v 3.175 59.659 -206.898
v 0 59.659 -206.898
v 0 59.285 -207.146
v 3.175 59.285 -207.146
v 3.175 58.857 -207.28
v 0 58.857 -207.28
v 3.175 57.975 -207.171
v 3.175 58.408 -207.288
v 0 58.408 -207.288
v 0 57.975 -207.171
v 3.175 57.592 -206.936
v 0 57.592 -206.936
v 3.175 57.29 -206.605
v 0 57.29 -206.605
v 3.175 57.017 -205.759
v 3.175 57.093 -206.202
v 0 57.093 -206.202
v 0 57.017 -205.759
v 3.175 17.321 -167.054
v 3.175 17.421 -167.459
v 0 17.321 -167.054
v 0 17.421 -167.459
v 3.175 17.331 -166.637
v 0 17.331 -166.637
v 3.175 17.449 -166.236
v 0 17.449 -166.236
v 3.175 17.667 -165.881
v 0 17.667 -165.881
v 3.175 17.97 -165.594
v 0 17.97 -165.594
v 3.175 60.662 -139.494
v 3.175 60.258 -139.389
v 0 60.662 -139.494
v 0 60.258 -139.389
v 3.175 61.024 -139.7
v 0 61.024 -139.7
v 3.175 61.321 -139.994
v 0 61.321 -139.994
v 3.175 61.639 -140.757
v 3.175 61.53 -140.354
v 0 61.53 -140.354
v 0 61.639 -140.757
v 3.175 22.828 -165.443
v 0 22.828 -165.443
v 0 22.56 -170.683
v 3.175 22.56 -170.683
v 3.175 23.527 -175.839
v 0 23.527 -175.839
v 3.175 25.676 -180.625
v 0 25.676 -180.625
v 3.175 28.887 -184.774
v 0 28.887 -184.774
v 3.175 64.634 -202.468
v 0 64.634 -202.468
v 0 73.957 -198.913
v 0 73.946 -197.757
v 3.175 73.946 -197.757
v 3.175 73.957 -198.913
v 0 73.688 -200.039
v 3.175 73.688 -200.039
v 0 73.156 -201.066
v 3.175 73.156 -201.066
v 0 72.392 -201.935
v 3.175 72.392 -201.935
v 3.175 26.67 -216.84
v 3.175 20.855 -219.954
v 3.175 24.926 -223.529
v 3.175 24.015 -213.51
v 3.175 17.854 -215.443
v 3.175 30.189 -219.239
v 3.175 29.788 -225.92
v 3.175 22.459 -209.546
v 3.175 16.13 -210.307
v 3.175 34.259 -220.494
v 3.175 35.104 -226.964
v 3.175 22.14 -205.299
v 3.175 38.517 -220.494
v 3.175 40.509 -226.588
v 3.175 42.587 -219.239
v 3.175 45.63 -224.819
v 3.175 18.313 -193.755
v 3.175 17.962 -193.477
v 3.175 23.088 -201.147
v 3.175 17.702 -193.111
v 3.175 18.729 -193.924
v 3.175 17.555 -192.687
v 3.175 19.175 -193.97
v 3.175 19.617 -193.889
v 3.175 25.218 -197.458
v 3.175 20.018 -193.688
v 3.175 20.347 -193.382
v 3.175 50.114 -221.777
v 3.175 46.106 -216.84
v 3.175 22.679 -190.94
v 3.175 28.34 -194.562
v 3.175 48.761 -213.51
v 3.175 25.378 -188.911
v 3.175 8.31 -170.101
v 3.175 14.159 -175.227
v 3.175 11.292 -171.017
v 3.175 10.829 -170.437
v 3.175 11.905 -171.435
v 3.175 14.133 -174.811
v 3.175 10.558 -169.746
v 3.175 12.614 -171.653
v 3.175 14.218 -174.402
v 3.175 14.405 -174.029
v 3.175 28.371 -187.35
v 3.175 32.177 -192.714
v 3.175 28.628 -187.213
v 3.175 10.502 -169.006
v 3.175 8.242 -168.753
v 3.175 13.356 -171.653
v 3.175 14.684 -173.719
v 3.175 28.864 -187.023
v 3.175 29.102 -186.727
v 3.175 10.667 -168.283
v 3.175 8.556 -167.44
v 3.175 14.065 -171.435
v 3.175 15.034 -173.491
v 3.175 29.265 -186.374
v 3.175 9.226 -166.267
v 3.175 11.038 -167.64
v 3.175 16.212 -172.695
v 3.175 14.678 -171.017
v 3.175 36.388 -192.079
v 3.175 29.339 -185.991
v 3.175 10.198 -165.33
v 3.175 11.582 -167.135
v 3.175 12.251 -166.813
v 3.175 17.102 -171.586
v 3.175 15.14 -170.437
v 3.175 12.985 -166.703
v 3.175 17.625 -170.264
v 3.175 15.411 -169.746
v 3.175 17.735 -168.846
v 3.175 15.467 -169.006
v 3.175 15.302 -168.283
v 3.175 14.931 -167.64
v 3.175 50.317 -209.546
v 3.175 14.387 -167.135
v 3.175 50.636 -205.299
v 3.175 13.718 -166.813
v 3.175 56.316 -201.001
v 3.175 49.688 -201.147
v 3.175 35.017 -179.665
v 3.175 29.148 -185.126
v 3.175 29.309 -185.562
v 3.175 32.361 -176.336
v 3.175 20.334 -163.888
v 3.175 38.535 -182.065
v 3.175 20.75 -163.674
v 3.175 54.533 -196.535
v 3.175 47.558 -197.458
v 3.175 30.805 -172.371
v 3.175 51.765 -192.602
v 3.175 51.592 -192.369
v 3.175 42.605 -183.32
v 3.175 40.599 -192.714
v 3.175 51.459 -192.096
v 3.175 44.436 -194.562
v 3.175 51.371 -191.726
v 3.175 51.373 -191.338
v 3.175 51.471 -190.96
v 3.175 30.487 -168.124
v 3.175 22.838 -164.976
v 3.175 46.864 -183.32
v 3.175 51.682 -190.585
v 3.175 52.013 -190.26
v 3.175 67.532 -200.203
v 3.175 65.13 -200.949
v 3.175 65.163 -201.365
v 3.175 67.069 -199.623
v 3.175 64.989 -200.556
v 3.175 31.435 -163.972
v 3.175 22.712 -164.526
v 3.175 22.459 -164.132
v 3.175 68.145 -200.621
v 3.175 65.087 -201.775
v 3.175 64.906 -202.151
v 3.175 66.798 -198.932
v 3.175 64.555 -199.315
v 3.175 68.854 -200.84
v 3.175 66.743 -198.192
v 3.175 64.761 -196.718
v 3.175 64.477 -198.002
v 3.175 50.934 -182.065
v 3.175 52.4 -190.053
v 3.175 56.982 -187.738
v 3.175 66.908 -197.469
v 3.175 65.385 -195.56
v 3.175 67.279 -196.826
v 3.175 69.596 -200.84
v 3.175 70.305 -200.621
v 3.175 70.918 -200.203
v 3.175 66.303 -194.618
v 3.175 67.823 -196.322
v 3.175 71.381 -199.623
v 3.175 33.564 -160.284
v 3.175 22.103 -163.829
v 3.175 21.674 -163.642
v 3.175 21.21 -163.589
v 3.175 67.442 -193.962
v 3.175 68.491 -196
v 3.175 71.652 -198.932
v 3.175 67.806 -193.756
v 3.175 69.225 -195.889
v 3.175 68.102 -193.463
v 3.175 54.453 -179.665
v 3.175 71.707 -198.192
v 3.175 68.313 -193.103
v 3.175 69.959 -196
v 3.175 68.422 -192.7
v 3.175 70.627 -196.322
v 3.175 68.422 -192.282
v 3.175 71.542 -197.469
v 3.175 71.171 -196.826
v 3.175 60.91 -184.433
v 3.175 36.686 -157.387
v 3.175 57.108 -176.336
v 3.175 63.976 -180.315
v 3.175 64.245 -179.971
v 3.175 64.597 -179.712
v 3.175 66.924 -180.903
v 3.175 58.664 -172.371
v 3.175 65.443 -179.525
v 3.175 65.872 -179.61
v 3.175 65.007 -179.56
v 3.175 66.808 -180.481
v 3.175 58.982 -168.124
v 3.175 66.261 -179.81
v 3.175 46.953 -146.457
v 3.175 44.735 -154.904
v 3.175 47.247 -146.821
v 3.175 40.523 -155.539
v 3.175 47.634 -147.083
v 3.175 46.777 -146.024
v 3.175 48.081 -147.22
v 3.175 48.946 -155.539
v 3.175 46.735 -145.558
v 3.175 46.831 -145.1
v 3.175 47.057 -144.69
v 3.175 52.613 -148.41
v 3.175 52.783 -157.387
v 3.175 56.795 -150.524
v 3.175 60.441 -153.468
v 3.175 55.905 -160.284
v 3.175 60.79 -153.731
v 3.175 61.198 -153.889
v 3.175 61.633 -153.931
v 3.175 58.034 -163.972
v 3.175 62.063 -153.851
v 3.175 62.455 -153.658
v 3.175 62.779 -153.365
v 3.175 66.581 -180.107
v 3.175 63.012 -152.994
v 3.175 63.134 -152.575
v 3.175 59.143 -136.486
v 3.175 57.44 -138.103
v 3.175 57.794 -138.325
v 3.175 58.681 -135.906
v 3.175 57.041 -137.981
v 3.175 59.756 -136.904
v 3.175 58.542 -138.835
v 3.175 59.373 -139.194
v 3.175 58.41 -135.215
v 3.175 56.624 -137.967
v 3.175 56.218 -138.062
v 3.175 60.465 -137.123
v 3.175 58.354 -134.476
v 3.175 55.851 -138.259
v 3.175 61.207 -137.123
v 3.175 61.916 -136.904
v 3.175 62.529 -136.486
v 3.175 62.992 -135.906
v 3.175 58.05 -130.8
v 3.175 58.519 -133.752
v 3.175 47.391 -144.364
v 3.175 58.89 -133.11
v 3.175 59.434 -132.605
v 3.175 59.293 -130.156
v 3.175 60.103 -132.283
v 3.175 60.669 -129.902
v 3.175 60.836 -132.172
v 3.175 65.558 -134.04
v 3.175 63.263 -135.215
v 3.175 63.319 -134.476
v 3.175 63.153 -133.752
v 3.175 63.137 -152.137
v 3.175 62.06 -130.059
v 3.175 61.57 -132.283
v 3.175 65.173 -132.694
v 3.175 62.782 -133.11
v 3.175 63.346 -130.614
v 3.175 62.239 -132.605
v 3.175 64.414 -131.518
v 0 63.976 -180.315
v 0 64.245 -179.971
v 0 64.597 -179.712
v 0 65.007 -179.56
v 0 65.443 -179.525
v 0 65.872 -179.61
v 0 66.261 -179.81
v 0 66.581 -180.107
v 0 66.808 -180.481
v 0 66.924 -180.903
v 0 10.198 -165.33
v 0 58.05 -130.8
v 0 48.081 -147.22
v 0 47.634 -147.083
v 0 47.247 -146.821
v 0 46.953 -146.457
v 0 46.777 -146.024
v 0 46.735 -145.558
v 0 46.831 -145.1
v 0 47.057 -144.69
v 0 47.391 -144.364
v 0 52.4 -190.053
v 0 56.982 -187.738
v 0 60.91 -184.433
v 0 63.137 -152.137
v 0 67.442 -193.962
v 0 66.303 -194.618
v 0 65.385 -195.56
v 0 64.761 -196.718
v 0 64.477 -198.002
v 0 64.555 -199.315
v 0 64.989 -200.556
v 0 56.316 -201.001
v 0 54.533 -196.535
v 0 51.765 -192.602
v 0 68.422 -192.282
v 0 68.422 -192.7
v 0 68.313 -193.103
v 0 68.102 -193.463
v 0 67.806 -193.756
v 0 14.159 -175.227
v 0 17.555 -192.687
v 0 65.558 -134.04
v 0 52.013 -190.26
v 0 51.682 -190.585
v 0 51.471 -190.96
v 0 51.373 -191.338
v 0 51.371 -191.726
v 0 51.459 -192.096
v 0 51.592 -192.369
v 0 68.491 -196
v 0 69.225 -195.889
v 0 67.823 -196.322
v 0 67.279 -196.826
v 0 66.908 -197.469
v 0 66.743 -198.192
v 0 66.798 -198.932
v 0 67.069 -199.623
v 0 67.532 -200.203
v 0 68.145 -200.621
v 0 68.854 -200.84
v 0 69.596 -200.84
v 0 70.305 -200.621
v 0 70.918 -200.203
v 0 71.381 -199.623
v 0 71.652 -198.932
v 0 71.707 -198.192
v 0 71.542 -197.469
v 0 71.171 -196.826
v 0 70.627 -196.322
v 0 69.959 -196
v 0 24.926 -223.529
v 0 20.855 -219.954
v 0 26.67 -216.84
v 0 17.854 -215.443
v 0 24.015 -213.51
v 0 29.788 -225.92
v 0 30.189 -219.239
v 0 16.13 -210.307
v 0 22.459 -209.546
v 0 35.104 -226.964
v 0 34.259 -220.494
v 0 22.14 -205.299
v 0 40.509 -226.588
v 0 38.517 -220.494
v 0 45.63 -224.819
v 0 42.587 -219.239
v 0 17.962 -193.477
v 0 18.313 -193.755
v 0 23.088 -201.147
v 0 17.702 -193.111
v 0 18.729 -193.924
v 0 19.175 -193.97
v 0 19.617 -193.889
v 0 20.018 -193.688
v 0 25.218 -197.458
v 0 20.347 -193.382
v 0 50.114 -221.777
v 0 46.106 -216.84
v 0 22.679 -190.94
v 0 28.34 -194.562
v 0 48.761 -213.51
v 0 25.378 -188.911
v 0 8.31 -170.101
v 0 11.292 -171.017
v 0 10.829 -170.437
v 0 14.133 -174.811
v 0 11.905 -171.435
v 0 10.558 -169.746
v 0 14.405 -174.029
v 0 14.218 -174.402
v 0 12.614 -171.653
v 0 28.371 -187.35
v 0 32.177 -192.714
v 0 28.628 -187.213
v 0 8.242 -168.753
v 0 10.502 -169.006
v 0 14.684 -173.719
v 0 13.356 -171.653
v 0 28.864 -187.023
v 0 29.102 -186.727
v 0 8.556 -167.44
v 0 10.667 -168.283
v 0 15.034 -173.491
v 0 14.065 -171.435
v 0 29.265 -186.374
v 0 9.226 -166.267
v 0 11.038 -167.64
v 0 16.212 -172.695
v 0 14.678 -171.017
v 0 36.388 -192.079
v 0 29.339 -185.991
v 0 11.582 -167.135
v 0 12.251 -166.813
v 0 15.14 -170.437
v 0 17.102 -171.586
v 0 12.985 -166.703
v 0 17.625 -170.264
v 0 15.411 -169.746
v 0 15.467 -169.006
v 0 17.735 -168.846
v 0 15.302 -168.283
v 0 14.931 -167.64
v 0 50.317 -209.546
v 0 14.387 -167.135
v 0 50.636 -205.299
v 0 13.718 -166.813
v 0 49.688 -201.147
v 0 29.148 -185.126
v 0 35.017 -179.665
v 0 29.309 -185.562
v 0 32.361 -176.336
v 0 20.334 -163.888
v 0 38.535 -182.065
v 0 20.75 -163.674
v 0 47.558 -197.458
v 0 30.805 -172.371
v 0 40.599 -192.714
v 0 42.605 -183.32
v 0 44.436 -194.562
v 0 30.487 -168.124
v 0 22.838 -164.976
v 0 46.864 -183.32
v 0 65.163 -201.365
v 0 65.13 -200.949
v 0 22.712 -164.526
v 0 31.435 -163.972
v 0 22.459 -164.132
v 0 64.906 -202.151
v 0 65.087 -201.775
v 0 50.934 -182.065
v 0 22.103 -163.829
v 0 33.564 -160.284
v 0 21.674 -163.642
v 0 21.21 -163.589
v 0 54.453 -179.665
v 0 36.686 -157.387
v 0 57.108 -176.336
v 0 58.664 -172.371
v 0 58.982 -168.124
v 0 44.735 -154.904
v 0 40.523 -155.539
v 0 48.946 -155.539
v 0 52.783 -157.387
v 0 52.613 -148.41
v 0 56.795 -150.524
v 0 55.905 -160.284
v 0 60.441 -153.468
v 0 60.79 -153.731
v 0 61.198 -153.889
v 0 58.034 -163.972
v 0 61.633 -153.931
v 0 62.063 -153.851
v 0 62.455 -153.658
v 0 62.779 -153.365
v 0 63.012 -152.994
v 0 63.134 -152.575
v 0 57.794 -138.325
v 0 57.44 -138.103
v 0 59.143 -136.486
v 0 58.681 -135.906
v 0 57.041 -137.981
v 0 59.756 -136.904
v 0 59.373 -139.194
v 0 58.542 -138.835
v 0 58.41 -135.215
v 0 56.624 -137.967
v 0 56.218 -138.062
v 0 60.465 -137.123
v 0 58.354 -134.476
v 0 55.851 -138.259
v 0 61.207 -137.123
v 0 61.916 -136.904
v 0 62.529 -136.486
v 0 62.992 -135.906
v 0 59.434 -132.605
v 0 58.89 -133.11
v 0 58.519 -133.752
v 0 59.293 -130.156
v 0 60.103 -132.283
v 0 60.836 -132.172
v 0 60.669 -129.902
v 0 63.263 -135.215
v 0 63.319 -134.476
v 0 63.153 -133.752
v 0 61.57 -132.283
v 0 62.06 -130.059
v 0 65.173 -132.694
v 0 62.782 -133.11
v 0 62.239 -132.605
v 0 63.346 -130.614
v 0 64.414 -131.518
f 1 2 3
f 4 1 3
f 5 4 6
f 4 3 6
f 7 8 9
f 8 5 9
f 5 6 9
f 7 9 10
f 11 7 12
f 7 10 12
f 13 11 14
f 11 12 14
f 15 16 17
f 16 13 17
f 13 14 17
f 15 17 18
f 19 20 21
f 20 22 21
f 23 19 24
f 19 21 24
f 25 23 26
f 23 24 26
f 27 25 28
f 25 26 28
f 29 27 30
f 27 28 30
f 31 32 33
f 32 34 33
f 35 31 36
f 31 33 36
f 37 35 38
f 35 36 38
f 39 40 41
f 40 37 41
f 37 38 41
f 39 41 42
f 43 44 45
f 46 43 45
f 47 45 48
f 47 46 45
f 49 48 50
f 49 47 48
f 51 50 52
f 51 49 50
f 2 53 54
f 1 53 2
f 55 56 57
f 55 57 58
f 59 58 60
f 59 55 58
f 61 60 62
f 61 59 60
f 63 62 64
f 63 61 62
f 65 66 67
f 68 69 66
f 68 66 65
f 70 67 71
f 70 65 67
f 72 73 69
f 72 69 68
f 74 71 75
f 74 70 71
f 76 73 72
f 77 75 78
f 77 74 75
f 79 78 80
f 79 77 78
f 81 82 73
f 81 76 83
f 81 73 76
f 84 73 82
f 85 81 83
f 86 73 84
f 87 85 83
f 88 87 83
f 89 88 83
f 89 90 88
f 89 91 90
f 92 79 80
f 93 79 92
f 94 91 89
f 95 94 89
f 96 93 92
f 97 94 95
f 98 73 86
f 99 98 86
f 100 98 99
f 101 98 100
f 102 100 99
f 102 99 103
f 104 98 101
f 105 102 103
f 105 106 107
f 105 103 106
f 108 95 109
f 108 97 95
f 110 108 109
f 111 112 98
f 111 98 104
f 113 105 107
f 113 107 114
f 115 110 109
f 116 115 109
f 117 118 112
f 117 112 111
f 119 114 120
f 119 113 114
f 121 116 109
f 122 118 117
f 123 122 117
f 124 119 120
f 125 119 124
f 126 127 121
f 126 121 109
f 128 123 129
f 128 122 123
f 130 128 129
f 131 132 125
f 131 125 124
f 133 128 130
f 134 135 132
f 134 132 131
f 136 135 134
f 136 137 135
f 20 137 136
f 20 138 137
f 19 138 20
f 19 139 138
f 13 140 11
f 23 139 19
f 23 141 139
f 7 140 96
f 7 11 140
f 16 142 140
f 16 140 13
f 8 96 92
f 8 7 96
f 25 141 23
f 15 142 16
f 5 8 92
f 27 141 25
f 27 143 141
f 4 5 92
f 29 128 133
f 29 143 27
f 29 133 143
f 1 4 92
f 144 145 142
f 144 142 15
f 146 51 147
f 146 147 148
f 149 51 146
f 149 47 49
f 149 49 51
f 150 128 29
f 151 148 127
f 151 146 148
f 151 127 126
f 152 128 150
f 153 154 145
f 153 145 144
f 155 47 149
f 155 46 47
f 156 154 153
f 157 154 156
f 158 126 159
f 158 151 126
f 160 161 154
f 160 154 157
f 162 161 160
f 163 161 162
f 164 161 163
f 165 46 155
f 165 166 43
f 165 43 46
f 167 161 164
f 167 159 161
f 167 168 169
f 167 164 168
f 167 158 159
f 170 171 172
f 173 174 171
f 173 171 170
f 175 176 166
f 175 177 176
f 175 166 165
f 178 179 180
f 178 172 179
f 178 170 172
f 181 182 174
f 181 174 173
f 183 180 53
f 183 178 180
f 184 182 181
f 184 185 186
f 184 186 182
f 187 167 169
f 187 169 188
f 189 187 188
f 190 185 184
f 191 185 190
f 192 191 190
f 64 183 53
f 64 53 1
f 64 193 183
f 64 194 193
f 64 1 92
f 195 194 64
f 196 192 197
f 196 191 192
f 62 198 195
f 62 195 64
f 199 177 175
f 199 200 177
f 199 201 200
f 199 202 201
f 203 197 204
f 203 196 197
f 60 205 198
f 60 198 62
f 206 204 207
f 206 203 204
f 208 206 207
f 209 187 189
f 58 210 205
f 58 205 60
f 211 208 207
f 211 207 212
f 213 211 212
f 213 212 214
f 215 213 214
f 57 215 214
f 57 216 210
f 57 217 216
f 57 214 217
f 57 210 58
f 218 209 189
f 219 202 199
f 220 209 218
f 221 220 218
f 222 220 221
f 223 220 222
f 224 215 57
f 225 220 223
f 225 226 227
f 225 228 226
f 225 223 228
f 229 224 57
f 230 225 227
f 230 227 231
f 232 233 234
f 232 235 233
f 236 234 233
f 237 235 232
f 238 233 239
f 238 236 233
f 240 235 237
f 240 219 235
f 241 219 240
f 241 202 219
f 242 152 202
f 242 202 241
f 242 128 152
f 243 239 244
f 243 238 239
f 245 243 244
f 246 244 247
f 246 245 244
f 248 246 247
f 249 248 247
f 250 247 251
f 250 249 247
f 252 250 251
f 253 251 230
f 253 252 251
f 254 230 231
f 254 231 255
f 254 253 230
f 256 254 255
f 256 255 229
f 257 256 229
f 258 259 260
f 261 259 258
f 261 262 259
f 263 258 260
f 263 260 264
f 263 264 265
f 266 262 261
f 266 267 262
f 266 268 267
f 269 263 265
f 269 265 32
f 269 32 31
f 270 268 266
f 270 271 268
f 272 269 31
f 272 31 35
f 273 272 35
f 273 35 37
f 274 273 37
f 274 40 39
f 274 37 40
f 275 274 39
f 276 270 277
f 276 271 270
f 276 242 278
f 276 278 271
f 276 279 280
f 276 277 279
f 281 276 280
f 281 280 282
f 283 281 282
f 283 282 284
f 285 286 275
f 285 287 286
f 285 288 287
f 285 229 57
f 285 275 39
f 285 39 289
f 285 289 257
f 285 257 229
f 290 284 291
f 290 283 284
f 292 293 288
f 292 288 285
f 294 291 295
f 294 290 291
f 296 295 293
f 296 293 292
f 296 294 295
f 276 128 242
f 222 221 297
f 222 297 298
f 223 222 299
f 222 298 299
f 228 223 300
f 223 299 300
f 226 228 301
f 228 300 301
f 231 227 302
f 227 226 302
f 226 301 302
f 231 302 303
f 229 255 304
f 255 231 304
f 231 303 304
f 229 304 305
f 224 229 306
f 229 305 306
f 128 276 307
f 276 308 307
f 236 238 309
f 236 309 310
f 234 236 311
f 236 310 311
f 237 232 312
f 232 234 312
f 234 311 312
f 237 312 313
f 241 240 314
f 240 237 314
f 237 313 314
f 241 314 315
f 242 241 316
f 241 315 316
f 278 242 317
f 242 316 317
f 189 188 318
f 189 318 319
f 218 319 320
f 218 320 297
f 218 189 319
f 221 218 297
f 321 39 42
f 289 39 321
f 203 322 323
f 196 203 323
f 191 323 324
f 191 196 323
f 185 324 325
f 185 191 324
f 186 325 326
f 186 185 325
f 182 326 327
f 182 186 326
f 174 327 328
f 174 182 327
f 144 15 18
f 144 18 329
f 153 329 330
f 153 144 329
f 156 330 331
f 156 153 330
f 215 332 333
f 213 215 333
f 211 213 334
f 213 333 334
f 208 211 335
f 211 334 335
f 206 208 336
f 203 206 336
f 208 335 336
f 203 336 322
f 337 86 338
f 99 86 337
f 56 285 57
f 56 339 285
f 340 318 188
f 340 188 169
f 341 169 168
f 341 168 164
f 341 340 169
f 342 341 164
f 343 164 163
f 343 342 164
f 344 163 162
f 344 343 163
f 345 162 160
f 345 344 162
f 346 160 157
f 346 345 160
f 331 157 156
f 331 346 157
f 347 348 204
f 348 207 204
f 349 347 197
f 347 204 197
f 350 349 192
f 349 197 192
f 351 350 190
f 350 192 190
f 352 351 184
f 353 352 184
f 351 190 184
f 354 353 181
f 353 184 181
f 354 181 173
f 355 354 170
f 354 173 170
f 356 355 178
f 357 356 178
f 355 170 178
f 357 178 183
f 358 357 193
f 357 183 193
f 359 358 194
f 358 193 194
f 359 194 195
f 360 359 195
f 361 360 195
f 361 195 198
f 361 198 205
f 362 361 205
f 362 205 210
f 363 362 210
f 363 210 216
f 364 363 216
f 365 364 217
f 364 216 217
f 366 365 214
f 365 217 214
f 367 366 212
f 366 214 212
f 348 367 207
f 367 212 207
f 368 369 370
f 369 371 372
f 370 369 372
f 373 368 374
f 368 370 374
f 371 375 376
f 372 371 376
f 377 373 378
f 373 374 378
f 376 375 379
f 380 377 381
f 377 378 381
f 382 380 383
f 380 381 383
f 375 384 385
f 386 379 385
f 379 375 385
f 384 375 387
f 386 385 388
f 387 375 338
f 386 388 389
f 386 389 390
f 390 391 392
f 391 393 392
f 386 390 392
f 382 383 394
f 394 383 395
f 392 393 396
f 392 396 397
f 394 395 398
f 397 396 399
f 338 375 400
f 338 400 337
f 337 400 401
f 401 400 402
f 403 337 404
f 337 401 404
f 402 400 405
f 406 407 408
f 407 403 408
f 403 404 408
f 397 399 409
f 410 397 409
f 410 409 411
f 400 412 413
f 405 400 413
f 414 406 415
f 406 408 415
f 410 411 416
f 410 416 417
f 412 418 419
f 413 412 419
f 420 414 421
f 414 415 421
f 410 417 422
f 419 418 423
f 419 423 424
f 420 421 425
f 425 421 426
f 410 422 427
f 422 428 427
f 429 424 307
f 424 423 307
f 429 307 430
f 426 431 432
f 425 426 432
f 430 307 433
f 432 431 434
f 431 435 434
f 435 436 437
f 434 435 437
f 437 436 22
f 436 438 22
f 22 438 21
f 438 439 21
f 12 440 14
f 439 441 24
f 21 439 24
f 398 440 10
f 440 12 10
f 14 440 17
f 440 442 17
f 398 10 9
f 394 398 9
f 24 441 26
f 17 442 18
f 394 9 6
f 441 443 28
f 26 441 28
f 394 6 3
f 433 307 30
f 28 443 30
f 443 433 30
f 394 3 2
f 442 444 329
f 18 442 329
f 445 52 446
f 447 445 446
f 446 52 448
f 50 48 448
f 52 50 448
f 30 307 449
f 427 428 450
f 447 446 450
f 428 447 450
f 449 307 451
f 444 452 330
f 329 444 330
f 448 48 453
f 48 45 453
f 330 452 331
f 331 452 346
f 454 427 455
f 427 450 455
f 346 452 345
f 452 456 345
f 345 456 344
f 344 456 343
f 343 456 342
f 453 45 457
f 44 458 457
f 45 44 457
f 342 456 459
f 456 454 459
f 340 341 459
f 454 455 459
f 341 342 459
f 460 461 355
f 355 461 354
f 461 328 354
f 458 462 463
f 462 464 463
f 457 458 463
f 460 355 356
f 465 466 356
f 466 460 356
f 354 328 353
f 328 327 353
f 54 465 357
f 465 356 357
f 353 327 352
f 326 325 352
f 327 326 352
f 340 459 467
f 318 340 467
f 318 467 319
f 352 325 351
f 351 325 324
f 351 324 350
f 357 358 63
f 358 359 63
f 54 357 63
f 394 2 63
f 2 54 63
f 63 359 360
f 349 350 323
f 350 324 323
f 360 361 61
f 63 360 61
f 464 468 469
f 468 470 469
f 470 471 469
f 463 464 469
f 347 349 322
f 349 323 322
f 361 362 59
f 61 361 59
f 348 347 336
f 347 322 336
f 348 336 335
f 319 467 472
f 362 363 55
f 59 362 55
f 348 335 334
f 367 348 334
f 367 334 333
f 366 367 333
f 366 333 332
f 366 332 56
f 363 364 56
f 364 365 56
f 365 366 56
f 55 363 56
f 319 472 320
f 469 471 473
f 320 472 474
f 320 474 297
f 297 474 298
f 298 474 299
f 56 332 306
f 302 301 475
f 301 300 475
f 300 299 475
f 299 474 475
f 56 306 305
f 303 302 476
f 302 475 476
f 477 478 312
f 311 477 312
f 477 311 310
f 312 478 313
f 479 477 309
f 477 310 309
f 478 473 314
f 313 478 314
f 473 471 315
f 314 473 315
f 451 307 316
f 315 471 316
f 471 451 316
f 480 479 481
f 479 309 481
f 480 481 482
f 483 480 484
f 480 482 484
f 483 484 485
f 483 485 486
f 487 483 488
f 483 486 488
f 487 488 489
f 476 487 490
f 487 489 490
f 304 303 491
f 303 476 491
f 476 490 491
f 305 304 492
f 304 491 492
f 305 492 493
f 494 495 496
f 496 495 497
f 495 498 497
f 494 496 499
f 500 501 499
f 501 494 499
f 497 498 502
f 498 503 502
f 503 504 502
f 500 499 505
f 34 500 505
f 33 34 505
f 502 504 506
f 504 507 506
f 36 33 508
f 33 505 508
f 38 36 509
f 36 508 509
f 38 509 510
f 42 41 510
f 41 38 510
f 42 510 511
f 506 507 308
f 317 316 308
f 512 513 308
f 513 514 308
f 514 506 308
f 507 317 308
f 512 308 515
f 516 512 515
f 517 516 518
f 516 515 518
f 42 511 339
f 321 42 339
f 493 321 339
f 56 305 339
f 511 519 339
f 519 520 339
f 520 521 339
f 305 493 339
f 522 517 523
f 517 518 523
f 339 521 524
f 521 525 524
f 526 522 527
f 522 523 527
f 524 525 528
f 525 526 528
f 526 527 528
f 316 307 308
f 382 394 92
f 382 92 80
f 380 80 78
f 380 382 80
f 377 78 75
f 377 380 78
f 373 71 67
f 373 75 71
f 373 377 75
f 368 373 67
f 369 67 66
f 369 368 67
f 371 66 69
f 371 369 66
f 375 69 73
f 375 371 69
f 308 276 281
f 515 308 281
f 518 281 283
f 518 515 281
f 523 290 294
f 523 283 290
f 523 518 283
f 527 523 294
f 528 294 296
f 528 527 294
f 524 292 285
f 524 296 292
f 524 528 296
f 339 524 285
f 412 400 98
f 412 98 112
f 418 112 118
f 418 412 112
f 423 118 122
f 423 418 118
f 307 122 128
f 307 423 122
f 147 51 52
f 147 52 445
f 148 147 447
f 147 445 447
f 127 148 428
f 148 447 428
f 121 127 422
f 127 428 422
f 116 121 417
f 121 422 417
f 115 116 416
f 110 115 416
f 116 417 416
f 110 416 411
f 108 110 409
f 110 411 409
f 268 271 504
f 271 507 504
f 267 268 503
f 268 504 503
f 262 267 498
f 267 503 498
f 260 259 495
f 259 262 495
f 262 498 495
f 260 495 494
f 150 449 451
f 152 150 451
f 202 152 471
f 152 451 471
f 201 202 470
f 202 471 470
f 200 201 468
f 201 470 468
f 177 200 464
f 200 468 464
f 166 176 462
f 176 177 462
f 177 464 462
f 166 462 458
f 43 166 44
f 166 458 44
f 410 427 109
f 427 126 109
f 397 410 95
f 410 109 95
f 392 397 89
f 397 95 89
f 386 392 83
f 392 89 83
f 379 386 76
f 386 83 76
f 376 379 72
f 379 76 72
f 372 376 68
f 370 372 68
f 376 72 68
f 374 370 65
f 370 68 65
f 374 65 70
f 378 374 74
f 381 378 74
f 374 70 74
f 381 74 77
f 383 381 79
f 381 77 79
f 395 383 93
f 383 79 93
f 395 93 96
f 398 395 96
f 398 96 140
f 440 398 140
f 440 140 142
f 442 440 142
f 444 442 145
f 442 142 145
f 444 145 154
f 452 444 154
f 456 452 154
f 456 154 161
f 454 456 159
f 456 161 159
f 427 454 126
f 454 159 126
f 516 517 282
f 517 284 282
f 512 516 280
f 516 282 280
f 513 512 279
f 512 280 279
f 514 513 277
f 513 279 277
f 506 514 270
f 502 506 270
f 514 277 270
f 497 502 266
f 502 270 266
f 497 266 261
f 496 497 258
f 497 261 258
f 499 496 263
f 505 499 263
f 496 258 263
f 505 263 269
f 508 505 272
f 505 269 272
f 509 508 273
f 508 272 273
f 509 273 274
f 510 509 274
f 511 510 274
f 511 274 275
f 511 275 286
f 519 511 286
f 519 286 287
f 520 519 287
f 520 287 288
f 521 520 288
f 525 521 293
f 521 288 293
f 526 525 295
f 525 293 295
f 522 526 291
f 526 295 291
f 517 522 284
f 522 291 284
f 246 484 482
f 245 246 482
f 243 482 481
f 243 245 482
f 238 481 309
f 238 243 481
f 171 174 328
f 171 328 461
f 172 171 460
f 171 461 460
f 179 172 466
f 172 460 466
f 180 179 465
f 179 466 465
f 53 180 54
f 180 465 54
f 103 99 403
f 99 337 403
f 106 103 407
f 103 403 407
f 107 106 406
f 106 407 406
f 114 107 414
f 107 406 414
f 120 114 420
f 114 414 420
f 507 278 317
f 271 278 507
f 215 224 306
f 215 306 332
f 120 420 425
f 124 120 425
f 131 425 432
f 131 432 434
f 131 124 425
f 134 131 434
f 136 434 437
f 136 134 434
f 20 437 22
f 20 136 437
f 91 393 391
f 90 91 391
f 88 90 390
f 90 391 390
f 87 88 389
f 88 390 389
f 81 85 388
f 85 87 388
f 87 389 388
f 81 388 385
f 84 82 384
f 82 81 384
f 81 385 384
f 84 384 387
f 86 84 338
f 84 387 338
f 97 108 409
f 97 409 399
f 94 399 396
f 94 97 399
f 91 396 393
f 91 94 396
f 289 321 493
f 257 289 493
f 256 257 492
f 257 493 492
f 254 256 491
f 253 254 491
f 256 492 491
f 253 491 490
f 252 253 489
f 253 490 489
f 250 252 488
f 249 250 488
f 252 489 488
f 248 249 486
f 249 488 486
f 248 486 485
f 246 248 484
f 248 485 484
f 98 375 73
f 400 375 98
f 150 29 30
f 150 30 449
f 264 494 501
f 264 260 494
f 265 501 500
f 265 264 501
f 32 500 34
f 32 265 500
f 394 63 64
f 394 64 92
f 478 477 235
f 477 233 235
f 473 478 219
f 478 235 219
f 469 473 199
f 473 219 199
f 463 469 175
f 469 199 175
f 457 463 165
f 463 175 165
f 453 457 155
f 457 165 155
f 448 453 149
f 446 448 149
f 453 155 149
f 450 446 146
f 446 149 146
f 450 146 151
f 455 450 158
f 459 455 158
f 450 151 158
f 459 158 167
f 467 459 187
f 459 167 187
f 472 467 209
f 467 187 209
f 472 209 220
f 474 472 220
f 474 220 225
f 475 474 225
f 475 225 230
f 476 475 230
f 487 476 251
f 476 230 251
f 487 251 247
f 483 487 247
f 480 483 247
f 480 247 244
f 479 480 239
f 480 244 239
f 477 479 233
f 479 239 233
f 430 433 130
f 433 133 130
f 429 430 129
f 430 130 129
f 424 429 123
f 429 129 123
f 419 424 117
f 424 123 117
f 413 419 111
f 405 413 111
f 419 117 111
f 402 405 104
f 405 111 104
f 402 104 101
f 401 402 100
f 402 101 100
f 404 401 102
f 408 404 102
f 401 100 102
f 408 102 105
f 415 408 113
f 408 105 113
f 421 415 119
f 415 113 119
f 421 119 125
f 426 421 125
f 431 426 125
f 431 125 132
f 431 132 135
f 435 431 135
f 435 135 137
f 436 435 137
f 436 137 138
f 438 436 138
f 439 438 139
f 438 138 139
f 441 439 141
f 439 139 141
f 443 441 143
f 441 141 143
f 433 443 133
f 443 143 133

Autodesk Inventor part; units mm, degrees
ref_plane "YZ Plane" through (0, 0, 0) normal (1, 0, 0) x (0, 1, 0)
ref_plane "XZ Plane" through (0, 0, 0) normal (0, 1, 0) x (-1, 0, 0)
ref_plane "XY Plane" through (0, 0, 0) normal (0, 0, 1) x (1, 0, 0)
sketch "Sketch1" plane through (0, 0, 0) normal (1, 0, 0) x (0, 1, 0)
  line L0 (0, -277.9865) -> (0, 46.3311) construction
  line L1 (36.388, -206.3665) -> (0, 0) construction
  arc A0 (16.1301, -210.3068) -> (50.1142, -221.7774) centre (36.388, -206.3665) ccw
  line L2 (60.8363, -134.6616) -> (44.7346, -169.192) construction
  arc A1 (65.5581, -134.04) -> (58.0495, -130.7996) centre (60.8363, -134.6616) ccw
  arc A2 (72.3924, -201.9346) -> (73.9465, -197.7566) centre (69.2248, -198.3782) ccw
  arc A3 (10.1977, -165.33) -> (8.3097, -170.1013) centre (12.9846, -169.192) ccw
  line L3 (65.5581, -134.04) -> (73.9465, -197.7566)
  line L4 (72.3924, -201.9346) -> (50.1142, -221.7774)
  line L5 (16.1301, -210.3068) -> (8.3097, -170.1013)
  line L6 (69.2248, -198.3782) -> (44.7346, -169.192) construction
  line L7 (58.0495, -130.7996) -> (10.1977, -165.33)
  line L8 (44.7346, -169.192) -> (12.9846, -169.192) construction
  dimension "d8" = 209.55
  dimension "d9" = 175.006
  dimension "d11" = 10
  dimension "d12" = 20.6375
  dimension "d13" = 38.1
  dimension "d14" = 25
  dimension "d19" = 4.7625
  dimension "d37" = 40
  dimension "d39" = 90
  dimension "d40" = 31.75
  dimension "d41" = 38.1
extrude "Plate1" add sketch "Sketch1" along normal blind 3.175
hole "Hole1" at (0, 60.8363, -134.6616) at (0, 12.9846, -169.192) at (0, 69.2248, -198.3782) direction (1, 0, 0) diameter 4.9784 end through all clearance for "Flat Head Machine Screw (82)" size "#10" standard "Ansi Unified Screw Threads"
hole "Hole2" at (0, 36.388, -206.3665) at (0, 44.7346, -169.192) direction (1, 0, 0) diameter 28.575 end through all
sketch "Sketch2" plane through (3.175, 0, 0) normal (1, 0, 0) x (0, 0, -1)
  circle A0 centre (169.192, 44.7346) radius 14.2875 projected
  circle A1 centre (206.3665, 36.388) radius 14.2875 projected
  circle A2 centre (198.3782, 69.2248) radius 2.4892 projected
  circle A3 centre (169.192, 12.9846) radius 2.4892 projected
  circle A4 centre (134.6616, 60.8363) radius 2.4892 projected
  arc A5 (134.04, 65.5581) -> (130.7996, 58.0495) centre (134.6616, 60.8363) ccw projected
  line L0 (165.33, 10.1977) -> (130.7996, 58.0495) projected
  arc A6 (165.33, 10.1977) -> (170.1013, 8.3097) centre (169.192, 12.9846) ccw projected
  line L1 (210.3068, 16.1301) -> (170.1013, 8.3097) projected
  arc A7 (210.3068, 16.1301) -> (221.7774, 50.1142) centre (206.3665, 36.388) ccw projected
  line L2 (201.9346, 72.3924) -> (221.7774, 50.1142) projected
  arc A8 (201.9346, 72.3924) -> (197.7566, 73.9465) centre (198.3782, 69.2248) ccw projected
  line L3 (134.04, 65.5581) -> (197.7566, 73.9465) projected
  line L4 (134.6616, 60.8363) -> (198.3782, 69.2248)
  line L5 (198.3782, 69.2248) -> (218.221, 46.9466)
  arc A9 (209.3975, 20.805) -> (218.221, 46.9466) centre (206.3665, 36.388) ccw
  line L6 (209.3975, 20.805) -> (169.192, 12.9846)
  line L7 (169.192, 12.9846) -> (134.6616, 60.8363)
  circle A10 centre (134.6616, 60.8363) radius 4.7625
  circle A11 centre (198.3782, 69.2248) radius 4.7625
  circle A12 centre (169.192, 12.9846) radius 4.7625
  circle A13 centre (169.192, 44.7346) radius 22.225
  circle A14 centre (206.3665, 36.388) radius 20.6375
  point P0 (0, 0)
  point P1 (196.4534, 18.2872)
  point P2 (186.5015, 30.7943)
  point P3 (161.2634, 23.9719)
  point P4 (166.4051, 16.8466)
  point P5 (173.8668, 13.8939)
  point P6 (190.7995, 49.937)
  point P7 (209.4503, 56.7938)
  point P8 (201.5458, 65.6684)
  point P9 (193.6565, 68.6032)
  point P10 (175.0995, 66.1601)
  point P11 (146.9886, 43.7537)
  point P12 (157.9404, 63.901)
  point P13 (139.3834, 61.458)
  point P14 (137.4485, 56.9744)
  dimension "d42" = 4.7625
  dimension "d44" = 41.275
  dimension "d45" = 44.45
extrude "Cut1" cut sketch "Sketch2" against normal blind 3.175 contours A11 L5 A14 A13 L4 | A13 L7 A10 L4 | A14 L6 A12 L7 A13
fillet "Corner Round1" radius 1.5875 14 edges at (1.5875, 43.7537, -146.9886) (1.5875, 63.901, -157.9404) (1.5875, 56.9744, -137.4485) (1.5875, 56.7938, -209.4503) (1.5875, 30.7943, -186.5015) (1.5875, 13.8939, -173.8668) (1.5875, 18.2872, -196.4534) (1.5875, 49.937, -190.7995) (1.5875, 61.458, -139.3834) (1.5875, 68.6032, -193.6565) (1.5875, 65.6684, -201.5458) (1.5875, 66.1601, -175.0995) (1.5875, 16.8466, -166.4051) (1.5875, 23.9719, -161.2634)
equation "\"d25\" = Thickness"
equation "\"d46\" = Thickness"
equation "\"d7\" = Thickness"
equation "\"BendRadius\" = Thickness"
equation "\"BendReliefWidth\" = Thickness"
equation "\"BendReliefDepth\" = 0.5 * Thickness"
equation "\"CornerReliefSize\" = 4 * Thickness"
equation "\"MinimumRemnant\" = 2 * Thickness"
equation "\"TransitionRadius\" = BendRadius"
equation "\"JacobiRadiusSize\" = BendRadius"
equation "\"GapSize\" = Thickness"
equation "\"Thickness\" = 3.175"
properties part number "PLATE,BEARING,MOUNT"
